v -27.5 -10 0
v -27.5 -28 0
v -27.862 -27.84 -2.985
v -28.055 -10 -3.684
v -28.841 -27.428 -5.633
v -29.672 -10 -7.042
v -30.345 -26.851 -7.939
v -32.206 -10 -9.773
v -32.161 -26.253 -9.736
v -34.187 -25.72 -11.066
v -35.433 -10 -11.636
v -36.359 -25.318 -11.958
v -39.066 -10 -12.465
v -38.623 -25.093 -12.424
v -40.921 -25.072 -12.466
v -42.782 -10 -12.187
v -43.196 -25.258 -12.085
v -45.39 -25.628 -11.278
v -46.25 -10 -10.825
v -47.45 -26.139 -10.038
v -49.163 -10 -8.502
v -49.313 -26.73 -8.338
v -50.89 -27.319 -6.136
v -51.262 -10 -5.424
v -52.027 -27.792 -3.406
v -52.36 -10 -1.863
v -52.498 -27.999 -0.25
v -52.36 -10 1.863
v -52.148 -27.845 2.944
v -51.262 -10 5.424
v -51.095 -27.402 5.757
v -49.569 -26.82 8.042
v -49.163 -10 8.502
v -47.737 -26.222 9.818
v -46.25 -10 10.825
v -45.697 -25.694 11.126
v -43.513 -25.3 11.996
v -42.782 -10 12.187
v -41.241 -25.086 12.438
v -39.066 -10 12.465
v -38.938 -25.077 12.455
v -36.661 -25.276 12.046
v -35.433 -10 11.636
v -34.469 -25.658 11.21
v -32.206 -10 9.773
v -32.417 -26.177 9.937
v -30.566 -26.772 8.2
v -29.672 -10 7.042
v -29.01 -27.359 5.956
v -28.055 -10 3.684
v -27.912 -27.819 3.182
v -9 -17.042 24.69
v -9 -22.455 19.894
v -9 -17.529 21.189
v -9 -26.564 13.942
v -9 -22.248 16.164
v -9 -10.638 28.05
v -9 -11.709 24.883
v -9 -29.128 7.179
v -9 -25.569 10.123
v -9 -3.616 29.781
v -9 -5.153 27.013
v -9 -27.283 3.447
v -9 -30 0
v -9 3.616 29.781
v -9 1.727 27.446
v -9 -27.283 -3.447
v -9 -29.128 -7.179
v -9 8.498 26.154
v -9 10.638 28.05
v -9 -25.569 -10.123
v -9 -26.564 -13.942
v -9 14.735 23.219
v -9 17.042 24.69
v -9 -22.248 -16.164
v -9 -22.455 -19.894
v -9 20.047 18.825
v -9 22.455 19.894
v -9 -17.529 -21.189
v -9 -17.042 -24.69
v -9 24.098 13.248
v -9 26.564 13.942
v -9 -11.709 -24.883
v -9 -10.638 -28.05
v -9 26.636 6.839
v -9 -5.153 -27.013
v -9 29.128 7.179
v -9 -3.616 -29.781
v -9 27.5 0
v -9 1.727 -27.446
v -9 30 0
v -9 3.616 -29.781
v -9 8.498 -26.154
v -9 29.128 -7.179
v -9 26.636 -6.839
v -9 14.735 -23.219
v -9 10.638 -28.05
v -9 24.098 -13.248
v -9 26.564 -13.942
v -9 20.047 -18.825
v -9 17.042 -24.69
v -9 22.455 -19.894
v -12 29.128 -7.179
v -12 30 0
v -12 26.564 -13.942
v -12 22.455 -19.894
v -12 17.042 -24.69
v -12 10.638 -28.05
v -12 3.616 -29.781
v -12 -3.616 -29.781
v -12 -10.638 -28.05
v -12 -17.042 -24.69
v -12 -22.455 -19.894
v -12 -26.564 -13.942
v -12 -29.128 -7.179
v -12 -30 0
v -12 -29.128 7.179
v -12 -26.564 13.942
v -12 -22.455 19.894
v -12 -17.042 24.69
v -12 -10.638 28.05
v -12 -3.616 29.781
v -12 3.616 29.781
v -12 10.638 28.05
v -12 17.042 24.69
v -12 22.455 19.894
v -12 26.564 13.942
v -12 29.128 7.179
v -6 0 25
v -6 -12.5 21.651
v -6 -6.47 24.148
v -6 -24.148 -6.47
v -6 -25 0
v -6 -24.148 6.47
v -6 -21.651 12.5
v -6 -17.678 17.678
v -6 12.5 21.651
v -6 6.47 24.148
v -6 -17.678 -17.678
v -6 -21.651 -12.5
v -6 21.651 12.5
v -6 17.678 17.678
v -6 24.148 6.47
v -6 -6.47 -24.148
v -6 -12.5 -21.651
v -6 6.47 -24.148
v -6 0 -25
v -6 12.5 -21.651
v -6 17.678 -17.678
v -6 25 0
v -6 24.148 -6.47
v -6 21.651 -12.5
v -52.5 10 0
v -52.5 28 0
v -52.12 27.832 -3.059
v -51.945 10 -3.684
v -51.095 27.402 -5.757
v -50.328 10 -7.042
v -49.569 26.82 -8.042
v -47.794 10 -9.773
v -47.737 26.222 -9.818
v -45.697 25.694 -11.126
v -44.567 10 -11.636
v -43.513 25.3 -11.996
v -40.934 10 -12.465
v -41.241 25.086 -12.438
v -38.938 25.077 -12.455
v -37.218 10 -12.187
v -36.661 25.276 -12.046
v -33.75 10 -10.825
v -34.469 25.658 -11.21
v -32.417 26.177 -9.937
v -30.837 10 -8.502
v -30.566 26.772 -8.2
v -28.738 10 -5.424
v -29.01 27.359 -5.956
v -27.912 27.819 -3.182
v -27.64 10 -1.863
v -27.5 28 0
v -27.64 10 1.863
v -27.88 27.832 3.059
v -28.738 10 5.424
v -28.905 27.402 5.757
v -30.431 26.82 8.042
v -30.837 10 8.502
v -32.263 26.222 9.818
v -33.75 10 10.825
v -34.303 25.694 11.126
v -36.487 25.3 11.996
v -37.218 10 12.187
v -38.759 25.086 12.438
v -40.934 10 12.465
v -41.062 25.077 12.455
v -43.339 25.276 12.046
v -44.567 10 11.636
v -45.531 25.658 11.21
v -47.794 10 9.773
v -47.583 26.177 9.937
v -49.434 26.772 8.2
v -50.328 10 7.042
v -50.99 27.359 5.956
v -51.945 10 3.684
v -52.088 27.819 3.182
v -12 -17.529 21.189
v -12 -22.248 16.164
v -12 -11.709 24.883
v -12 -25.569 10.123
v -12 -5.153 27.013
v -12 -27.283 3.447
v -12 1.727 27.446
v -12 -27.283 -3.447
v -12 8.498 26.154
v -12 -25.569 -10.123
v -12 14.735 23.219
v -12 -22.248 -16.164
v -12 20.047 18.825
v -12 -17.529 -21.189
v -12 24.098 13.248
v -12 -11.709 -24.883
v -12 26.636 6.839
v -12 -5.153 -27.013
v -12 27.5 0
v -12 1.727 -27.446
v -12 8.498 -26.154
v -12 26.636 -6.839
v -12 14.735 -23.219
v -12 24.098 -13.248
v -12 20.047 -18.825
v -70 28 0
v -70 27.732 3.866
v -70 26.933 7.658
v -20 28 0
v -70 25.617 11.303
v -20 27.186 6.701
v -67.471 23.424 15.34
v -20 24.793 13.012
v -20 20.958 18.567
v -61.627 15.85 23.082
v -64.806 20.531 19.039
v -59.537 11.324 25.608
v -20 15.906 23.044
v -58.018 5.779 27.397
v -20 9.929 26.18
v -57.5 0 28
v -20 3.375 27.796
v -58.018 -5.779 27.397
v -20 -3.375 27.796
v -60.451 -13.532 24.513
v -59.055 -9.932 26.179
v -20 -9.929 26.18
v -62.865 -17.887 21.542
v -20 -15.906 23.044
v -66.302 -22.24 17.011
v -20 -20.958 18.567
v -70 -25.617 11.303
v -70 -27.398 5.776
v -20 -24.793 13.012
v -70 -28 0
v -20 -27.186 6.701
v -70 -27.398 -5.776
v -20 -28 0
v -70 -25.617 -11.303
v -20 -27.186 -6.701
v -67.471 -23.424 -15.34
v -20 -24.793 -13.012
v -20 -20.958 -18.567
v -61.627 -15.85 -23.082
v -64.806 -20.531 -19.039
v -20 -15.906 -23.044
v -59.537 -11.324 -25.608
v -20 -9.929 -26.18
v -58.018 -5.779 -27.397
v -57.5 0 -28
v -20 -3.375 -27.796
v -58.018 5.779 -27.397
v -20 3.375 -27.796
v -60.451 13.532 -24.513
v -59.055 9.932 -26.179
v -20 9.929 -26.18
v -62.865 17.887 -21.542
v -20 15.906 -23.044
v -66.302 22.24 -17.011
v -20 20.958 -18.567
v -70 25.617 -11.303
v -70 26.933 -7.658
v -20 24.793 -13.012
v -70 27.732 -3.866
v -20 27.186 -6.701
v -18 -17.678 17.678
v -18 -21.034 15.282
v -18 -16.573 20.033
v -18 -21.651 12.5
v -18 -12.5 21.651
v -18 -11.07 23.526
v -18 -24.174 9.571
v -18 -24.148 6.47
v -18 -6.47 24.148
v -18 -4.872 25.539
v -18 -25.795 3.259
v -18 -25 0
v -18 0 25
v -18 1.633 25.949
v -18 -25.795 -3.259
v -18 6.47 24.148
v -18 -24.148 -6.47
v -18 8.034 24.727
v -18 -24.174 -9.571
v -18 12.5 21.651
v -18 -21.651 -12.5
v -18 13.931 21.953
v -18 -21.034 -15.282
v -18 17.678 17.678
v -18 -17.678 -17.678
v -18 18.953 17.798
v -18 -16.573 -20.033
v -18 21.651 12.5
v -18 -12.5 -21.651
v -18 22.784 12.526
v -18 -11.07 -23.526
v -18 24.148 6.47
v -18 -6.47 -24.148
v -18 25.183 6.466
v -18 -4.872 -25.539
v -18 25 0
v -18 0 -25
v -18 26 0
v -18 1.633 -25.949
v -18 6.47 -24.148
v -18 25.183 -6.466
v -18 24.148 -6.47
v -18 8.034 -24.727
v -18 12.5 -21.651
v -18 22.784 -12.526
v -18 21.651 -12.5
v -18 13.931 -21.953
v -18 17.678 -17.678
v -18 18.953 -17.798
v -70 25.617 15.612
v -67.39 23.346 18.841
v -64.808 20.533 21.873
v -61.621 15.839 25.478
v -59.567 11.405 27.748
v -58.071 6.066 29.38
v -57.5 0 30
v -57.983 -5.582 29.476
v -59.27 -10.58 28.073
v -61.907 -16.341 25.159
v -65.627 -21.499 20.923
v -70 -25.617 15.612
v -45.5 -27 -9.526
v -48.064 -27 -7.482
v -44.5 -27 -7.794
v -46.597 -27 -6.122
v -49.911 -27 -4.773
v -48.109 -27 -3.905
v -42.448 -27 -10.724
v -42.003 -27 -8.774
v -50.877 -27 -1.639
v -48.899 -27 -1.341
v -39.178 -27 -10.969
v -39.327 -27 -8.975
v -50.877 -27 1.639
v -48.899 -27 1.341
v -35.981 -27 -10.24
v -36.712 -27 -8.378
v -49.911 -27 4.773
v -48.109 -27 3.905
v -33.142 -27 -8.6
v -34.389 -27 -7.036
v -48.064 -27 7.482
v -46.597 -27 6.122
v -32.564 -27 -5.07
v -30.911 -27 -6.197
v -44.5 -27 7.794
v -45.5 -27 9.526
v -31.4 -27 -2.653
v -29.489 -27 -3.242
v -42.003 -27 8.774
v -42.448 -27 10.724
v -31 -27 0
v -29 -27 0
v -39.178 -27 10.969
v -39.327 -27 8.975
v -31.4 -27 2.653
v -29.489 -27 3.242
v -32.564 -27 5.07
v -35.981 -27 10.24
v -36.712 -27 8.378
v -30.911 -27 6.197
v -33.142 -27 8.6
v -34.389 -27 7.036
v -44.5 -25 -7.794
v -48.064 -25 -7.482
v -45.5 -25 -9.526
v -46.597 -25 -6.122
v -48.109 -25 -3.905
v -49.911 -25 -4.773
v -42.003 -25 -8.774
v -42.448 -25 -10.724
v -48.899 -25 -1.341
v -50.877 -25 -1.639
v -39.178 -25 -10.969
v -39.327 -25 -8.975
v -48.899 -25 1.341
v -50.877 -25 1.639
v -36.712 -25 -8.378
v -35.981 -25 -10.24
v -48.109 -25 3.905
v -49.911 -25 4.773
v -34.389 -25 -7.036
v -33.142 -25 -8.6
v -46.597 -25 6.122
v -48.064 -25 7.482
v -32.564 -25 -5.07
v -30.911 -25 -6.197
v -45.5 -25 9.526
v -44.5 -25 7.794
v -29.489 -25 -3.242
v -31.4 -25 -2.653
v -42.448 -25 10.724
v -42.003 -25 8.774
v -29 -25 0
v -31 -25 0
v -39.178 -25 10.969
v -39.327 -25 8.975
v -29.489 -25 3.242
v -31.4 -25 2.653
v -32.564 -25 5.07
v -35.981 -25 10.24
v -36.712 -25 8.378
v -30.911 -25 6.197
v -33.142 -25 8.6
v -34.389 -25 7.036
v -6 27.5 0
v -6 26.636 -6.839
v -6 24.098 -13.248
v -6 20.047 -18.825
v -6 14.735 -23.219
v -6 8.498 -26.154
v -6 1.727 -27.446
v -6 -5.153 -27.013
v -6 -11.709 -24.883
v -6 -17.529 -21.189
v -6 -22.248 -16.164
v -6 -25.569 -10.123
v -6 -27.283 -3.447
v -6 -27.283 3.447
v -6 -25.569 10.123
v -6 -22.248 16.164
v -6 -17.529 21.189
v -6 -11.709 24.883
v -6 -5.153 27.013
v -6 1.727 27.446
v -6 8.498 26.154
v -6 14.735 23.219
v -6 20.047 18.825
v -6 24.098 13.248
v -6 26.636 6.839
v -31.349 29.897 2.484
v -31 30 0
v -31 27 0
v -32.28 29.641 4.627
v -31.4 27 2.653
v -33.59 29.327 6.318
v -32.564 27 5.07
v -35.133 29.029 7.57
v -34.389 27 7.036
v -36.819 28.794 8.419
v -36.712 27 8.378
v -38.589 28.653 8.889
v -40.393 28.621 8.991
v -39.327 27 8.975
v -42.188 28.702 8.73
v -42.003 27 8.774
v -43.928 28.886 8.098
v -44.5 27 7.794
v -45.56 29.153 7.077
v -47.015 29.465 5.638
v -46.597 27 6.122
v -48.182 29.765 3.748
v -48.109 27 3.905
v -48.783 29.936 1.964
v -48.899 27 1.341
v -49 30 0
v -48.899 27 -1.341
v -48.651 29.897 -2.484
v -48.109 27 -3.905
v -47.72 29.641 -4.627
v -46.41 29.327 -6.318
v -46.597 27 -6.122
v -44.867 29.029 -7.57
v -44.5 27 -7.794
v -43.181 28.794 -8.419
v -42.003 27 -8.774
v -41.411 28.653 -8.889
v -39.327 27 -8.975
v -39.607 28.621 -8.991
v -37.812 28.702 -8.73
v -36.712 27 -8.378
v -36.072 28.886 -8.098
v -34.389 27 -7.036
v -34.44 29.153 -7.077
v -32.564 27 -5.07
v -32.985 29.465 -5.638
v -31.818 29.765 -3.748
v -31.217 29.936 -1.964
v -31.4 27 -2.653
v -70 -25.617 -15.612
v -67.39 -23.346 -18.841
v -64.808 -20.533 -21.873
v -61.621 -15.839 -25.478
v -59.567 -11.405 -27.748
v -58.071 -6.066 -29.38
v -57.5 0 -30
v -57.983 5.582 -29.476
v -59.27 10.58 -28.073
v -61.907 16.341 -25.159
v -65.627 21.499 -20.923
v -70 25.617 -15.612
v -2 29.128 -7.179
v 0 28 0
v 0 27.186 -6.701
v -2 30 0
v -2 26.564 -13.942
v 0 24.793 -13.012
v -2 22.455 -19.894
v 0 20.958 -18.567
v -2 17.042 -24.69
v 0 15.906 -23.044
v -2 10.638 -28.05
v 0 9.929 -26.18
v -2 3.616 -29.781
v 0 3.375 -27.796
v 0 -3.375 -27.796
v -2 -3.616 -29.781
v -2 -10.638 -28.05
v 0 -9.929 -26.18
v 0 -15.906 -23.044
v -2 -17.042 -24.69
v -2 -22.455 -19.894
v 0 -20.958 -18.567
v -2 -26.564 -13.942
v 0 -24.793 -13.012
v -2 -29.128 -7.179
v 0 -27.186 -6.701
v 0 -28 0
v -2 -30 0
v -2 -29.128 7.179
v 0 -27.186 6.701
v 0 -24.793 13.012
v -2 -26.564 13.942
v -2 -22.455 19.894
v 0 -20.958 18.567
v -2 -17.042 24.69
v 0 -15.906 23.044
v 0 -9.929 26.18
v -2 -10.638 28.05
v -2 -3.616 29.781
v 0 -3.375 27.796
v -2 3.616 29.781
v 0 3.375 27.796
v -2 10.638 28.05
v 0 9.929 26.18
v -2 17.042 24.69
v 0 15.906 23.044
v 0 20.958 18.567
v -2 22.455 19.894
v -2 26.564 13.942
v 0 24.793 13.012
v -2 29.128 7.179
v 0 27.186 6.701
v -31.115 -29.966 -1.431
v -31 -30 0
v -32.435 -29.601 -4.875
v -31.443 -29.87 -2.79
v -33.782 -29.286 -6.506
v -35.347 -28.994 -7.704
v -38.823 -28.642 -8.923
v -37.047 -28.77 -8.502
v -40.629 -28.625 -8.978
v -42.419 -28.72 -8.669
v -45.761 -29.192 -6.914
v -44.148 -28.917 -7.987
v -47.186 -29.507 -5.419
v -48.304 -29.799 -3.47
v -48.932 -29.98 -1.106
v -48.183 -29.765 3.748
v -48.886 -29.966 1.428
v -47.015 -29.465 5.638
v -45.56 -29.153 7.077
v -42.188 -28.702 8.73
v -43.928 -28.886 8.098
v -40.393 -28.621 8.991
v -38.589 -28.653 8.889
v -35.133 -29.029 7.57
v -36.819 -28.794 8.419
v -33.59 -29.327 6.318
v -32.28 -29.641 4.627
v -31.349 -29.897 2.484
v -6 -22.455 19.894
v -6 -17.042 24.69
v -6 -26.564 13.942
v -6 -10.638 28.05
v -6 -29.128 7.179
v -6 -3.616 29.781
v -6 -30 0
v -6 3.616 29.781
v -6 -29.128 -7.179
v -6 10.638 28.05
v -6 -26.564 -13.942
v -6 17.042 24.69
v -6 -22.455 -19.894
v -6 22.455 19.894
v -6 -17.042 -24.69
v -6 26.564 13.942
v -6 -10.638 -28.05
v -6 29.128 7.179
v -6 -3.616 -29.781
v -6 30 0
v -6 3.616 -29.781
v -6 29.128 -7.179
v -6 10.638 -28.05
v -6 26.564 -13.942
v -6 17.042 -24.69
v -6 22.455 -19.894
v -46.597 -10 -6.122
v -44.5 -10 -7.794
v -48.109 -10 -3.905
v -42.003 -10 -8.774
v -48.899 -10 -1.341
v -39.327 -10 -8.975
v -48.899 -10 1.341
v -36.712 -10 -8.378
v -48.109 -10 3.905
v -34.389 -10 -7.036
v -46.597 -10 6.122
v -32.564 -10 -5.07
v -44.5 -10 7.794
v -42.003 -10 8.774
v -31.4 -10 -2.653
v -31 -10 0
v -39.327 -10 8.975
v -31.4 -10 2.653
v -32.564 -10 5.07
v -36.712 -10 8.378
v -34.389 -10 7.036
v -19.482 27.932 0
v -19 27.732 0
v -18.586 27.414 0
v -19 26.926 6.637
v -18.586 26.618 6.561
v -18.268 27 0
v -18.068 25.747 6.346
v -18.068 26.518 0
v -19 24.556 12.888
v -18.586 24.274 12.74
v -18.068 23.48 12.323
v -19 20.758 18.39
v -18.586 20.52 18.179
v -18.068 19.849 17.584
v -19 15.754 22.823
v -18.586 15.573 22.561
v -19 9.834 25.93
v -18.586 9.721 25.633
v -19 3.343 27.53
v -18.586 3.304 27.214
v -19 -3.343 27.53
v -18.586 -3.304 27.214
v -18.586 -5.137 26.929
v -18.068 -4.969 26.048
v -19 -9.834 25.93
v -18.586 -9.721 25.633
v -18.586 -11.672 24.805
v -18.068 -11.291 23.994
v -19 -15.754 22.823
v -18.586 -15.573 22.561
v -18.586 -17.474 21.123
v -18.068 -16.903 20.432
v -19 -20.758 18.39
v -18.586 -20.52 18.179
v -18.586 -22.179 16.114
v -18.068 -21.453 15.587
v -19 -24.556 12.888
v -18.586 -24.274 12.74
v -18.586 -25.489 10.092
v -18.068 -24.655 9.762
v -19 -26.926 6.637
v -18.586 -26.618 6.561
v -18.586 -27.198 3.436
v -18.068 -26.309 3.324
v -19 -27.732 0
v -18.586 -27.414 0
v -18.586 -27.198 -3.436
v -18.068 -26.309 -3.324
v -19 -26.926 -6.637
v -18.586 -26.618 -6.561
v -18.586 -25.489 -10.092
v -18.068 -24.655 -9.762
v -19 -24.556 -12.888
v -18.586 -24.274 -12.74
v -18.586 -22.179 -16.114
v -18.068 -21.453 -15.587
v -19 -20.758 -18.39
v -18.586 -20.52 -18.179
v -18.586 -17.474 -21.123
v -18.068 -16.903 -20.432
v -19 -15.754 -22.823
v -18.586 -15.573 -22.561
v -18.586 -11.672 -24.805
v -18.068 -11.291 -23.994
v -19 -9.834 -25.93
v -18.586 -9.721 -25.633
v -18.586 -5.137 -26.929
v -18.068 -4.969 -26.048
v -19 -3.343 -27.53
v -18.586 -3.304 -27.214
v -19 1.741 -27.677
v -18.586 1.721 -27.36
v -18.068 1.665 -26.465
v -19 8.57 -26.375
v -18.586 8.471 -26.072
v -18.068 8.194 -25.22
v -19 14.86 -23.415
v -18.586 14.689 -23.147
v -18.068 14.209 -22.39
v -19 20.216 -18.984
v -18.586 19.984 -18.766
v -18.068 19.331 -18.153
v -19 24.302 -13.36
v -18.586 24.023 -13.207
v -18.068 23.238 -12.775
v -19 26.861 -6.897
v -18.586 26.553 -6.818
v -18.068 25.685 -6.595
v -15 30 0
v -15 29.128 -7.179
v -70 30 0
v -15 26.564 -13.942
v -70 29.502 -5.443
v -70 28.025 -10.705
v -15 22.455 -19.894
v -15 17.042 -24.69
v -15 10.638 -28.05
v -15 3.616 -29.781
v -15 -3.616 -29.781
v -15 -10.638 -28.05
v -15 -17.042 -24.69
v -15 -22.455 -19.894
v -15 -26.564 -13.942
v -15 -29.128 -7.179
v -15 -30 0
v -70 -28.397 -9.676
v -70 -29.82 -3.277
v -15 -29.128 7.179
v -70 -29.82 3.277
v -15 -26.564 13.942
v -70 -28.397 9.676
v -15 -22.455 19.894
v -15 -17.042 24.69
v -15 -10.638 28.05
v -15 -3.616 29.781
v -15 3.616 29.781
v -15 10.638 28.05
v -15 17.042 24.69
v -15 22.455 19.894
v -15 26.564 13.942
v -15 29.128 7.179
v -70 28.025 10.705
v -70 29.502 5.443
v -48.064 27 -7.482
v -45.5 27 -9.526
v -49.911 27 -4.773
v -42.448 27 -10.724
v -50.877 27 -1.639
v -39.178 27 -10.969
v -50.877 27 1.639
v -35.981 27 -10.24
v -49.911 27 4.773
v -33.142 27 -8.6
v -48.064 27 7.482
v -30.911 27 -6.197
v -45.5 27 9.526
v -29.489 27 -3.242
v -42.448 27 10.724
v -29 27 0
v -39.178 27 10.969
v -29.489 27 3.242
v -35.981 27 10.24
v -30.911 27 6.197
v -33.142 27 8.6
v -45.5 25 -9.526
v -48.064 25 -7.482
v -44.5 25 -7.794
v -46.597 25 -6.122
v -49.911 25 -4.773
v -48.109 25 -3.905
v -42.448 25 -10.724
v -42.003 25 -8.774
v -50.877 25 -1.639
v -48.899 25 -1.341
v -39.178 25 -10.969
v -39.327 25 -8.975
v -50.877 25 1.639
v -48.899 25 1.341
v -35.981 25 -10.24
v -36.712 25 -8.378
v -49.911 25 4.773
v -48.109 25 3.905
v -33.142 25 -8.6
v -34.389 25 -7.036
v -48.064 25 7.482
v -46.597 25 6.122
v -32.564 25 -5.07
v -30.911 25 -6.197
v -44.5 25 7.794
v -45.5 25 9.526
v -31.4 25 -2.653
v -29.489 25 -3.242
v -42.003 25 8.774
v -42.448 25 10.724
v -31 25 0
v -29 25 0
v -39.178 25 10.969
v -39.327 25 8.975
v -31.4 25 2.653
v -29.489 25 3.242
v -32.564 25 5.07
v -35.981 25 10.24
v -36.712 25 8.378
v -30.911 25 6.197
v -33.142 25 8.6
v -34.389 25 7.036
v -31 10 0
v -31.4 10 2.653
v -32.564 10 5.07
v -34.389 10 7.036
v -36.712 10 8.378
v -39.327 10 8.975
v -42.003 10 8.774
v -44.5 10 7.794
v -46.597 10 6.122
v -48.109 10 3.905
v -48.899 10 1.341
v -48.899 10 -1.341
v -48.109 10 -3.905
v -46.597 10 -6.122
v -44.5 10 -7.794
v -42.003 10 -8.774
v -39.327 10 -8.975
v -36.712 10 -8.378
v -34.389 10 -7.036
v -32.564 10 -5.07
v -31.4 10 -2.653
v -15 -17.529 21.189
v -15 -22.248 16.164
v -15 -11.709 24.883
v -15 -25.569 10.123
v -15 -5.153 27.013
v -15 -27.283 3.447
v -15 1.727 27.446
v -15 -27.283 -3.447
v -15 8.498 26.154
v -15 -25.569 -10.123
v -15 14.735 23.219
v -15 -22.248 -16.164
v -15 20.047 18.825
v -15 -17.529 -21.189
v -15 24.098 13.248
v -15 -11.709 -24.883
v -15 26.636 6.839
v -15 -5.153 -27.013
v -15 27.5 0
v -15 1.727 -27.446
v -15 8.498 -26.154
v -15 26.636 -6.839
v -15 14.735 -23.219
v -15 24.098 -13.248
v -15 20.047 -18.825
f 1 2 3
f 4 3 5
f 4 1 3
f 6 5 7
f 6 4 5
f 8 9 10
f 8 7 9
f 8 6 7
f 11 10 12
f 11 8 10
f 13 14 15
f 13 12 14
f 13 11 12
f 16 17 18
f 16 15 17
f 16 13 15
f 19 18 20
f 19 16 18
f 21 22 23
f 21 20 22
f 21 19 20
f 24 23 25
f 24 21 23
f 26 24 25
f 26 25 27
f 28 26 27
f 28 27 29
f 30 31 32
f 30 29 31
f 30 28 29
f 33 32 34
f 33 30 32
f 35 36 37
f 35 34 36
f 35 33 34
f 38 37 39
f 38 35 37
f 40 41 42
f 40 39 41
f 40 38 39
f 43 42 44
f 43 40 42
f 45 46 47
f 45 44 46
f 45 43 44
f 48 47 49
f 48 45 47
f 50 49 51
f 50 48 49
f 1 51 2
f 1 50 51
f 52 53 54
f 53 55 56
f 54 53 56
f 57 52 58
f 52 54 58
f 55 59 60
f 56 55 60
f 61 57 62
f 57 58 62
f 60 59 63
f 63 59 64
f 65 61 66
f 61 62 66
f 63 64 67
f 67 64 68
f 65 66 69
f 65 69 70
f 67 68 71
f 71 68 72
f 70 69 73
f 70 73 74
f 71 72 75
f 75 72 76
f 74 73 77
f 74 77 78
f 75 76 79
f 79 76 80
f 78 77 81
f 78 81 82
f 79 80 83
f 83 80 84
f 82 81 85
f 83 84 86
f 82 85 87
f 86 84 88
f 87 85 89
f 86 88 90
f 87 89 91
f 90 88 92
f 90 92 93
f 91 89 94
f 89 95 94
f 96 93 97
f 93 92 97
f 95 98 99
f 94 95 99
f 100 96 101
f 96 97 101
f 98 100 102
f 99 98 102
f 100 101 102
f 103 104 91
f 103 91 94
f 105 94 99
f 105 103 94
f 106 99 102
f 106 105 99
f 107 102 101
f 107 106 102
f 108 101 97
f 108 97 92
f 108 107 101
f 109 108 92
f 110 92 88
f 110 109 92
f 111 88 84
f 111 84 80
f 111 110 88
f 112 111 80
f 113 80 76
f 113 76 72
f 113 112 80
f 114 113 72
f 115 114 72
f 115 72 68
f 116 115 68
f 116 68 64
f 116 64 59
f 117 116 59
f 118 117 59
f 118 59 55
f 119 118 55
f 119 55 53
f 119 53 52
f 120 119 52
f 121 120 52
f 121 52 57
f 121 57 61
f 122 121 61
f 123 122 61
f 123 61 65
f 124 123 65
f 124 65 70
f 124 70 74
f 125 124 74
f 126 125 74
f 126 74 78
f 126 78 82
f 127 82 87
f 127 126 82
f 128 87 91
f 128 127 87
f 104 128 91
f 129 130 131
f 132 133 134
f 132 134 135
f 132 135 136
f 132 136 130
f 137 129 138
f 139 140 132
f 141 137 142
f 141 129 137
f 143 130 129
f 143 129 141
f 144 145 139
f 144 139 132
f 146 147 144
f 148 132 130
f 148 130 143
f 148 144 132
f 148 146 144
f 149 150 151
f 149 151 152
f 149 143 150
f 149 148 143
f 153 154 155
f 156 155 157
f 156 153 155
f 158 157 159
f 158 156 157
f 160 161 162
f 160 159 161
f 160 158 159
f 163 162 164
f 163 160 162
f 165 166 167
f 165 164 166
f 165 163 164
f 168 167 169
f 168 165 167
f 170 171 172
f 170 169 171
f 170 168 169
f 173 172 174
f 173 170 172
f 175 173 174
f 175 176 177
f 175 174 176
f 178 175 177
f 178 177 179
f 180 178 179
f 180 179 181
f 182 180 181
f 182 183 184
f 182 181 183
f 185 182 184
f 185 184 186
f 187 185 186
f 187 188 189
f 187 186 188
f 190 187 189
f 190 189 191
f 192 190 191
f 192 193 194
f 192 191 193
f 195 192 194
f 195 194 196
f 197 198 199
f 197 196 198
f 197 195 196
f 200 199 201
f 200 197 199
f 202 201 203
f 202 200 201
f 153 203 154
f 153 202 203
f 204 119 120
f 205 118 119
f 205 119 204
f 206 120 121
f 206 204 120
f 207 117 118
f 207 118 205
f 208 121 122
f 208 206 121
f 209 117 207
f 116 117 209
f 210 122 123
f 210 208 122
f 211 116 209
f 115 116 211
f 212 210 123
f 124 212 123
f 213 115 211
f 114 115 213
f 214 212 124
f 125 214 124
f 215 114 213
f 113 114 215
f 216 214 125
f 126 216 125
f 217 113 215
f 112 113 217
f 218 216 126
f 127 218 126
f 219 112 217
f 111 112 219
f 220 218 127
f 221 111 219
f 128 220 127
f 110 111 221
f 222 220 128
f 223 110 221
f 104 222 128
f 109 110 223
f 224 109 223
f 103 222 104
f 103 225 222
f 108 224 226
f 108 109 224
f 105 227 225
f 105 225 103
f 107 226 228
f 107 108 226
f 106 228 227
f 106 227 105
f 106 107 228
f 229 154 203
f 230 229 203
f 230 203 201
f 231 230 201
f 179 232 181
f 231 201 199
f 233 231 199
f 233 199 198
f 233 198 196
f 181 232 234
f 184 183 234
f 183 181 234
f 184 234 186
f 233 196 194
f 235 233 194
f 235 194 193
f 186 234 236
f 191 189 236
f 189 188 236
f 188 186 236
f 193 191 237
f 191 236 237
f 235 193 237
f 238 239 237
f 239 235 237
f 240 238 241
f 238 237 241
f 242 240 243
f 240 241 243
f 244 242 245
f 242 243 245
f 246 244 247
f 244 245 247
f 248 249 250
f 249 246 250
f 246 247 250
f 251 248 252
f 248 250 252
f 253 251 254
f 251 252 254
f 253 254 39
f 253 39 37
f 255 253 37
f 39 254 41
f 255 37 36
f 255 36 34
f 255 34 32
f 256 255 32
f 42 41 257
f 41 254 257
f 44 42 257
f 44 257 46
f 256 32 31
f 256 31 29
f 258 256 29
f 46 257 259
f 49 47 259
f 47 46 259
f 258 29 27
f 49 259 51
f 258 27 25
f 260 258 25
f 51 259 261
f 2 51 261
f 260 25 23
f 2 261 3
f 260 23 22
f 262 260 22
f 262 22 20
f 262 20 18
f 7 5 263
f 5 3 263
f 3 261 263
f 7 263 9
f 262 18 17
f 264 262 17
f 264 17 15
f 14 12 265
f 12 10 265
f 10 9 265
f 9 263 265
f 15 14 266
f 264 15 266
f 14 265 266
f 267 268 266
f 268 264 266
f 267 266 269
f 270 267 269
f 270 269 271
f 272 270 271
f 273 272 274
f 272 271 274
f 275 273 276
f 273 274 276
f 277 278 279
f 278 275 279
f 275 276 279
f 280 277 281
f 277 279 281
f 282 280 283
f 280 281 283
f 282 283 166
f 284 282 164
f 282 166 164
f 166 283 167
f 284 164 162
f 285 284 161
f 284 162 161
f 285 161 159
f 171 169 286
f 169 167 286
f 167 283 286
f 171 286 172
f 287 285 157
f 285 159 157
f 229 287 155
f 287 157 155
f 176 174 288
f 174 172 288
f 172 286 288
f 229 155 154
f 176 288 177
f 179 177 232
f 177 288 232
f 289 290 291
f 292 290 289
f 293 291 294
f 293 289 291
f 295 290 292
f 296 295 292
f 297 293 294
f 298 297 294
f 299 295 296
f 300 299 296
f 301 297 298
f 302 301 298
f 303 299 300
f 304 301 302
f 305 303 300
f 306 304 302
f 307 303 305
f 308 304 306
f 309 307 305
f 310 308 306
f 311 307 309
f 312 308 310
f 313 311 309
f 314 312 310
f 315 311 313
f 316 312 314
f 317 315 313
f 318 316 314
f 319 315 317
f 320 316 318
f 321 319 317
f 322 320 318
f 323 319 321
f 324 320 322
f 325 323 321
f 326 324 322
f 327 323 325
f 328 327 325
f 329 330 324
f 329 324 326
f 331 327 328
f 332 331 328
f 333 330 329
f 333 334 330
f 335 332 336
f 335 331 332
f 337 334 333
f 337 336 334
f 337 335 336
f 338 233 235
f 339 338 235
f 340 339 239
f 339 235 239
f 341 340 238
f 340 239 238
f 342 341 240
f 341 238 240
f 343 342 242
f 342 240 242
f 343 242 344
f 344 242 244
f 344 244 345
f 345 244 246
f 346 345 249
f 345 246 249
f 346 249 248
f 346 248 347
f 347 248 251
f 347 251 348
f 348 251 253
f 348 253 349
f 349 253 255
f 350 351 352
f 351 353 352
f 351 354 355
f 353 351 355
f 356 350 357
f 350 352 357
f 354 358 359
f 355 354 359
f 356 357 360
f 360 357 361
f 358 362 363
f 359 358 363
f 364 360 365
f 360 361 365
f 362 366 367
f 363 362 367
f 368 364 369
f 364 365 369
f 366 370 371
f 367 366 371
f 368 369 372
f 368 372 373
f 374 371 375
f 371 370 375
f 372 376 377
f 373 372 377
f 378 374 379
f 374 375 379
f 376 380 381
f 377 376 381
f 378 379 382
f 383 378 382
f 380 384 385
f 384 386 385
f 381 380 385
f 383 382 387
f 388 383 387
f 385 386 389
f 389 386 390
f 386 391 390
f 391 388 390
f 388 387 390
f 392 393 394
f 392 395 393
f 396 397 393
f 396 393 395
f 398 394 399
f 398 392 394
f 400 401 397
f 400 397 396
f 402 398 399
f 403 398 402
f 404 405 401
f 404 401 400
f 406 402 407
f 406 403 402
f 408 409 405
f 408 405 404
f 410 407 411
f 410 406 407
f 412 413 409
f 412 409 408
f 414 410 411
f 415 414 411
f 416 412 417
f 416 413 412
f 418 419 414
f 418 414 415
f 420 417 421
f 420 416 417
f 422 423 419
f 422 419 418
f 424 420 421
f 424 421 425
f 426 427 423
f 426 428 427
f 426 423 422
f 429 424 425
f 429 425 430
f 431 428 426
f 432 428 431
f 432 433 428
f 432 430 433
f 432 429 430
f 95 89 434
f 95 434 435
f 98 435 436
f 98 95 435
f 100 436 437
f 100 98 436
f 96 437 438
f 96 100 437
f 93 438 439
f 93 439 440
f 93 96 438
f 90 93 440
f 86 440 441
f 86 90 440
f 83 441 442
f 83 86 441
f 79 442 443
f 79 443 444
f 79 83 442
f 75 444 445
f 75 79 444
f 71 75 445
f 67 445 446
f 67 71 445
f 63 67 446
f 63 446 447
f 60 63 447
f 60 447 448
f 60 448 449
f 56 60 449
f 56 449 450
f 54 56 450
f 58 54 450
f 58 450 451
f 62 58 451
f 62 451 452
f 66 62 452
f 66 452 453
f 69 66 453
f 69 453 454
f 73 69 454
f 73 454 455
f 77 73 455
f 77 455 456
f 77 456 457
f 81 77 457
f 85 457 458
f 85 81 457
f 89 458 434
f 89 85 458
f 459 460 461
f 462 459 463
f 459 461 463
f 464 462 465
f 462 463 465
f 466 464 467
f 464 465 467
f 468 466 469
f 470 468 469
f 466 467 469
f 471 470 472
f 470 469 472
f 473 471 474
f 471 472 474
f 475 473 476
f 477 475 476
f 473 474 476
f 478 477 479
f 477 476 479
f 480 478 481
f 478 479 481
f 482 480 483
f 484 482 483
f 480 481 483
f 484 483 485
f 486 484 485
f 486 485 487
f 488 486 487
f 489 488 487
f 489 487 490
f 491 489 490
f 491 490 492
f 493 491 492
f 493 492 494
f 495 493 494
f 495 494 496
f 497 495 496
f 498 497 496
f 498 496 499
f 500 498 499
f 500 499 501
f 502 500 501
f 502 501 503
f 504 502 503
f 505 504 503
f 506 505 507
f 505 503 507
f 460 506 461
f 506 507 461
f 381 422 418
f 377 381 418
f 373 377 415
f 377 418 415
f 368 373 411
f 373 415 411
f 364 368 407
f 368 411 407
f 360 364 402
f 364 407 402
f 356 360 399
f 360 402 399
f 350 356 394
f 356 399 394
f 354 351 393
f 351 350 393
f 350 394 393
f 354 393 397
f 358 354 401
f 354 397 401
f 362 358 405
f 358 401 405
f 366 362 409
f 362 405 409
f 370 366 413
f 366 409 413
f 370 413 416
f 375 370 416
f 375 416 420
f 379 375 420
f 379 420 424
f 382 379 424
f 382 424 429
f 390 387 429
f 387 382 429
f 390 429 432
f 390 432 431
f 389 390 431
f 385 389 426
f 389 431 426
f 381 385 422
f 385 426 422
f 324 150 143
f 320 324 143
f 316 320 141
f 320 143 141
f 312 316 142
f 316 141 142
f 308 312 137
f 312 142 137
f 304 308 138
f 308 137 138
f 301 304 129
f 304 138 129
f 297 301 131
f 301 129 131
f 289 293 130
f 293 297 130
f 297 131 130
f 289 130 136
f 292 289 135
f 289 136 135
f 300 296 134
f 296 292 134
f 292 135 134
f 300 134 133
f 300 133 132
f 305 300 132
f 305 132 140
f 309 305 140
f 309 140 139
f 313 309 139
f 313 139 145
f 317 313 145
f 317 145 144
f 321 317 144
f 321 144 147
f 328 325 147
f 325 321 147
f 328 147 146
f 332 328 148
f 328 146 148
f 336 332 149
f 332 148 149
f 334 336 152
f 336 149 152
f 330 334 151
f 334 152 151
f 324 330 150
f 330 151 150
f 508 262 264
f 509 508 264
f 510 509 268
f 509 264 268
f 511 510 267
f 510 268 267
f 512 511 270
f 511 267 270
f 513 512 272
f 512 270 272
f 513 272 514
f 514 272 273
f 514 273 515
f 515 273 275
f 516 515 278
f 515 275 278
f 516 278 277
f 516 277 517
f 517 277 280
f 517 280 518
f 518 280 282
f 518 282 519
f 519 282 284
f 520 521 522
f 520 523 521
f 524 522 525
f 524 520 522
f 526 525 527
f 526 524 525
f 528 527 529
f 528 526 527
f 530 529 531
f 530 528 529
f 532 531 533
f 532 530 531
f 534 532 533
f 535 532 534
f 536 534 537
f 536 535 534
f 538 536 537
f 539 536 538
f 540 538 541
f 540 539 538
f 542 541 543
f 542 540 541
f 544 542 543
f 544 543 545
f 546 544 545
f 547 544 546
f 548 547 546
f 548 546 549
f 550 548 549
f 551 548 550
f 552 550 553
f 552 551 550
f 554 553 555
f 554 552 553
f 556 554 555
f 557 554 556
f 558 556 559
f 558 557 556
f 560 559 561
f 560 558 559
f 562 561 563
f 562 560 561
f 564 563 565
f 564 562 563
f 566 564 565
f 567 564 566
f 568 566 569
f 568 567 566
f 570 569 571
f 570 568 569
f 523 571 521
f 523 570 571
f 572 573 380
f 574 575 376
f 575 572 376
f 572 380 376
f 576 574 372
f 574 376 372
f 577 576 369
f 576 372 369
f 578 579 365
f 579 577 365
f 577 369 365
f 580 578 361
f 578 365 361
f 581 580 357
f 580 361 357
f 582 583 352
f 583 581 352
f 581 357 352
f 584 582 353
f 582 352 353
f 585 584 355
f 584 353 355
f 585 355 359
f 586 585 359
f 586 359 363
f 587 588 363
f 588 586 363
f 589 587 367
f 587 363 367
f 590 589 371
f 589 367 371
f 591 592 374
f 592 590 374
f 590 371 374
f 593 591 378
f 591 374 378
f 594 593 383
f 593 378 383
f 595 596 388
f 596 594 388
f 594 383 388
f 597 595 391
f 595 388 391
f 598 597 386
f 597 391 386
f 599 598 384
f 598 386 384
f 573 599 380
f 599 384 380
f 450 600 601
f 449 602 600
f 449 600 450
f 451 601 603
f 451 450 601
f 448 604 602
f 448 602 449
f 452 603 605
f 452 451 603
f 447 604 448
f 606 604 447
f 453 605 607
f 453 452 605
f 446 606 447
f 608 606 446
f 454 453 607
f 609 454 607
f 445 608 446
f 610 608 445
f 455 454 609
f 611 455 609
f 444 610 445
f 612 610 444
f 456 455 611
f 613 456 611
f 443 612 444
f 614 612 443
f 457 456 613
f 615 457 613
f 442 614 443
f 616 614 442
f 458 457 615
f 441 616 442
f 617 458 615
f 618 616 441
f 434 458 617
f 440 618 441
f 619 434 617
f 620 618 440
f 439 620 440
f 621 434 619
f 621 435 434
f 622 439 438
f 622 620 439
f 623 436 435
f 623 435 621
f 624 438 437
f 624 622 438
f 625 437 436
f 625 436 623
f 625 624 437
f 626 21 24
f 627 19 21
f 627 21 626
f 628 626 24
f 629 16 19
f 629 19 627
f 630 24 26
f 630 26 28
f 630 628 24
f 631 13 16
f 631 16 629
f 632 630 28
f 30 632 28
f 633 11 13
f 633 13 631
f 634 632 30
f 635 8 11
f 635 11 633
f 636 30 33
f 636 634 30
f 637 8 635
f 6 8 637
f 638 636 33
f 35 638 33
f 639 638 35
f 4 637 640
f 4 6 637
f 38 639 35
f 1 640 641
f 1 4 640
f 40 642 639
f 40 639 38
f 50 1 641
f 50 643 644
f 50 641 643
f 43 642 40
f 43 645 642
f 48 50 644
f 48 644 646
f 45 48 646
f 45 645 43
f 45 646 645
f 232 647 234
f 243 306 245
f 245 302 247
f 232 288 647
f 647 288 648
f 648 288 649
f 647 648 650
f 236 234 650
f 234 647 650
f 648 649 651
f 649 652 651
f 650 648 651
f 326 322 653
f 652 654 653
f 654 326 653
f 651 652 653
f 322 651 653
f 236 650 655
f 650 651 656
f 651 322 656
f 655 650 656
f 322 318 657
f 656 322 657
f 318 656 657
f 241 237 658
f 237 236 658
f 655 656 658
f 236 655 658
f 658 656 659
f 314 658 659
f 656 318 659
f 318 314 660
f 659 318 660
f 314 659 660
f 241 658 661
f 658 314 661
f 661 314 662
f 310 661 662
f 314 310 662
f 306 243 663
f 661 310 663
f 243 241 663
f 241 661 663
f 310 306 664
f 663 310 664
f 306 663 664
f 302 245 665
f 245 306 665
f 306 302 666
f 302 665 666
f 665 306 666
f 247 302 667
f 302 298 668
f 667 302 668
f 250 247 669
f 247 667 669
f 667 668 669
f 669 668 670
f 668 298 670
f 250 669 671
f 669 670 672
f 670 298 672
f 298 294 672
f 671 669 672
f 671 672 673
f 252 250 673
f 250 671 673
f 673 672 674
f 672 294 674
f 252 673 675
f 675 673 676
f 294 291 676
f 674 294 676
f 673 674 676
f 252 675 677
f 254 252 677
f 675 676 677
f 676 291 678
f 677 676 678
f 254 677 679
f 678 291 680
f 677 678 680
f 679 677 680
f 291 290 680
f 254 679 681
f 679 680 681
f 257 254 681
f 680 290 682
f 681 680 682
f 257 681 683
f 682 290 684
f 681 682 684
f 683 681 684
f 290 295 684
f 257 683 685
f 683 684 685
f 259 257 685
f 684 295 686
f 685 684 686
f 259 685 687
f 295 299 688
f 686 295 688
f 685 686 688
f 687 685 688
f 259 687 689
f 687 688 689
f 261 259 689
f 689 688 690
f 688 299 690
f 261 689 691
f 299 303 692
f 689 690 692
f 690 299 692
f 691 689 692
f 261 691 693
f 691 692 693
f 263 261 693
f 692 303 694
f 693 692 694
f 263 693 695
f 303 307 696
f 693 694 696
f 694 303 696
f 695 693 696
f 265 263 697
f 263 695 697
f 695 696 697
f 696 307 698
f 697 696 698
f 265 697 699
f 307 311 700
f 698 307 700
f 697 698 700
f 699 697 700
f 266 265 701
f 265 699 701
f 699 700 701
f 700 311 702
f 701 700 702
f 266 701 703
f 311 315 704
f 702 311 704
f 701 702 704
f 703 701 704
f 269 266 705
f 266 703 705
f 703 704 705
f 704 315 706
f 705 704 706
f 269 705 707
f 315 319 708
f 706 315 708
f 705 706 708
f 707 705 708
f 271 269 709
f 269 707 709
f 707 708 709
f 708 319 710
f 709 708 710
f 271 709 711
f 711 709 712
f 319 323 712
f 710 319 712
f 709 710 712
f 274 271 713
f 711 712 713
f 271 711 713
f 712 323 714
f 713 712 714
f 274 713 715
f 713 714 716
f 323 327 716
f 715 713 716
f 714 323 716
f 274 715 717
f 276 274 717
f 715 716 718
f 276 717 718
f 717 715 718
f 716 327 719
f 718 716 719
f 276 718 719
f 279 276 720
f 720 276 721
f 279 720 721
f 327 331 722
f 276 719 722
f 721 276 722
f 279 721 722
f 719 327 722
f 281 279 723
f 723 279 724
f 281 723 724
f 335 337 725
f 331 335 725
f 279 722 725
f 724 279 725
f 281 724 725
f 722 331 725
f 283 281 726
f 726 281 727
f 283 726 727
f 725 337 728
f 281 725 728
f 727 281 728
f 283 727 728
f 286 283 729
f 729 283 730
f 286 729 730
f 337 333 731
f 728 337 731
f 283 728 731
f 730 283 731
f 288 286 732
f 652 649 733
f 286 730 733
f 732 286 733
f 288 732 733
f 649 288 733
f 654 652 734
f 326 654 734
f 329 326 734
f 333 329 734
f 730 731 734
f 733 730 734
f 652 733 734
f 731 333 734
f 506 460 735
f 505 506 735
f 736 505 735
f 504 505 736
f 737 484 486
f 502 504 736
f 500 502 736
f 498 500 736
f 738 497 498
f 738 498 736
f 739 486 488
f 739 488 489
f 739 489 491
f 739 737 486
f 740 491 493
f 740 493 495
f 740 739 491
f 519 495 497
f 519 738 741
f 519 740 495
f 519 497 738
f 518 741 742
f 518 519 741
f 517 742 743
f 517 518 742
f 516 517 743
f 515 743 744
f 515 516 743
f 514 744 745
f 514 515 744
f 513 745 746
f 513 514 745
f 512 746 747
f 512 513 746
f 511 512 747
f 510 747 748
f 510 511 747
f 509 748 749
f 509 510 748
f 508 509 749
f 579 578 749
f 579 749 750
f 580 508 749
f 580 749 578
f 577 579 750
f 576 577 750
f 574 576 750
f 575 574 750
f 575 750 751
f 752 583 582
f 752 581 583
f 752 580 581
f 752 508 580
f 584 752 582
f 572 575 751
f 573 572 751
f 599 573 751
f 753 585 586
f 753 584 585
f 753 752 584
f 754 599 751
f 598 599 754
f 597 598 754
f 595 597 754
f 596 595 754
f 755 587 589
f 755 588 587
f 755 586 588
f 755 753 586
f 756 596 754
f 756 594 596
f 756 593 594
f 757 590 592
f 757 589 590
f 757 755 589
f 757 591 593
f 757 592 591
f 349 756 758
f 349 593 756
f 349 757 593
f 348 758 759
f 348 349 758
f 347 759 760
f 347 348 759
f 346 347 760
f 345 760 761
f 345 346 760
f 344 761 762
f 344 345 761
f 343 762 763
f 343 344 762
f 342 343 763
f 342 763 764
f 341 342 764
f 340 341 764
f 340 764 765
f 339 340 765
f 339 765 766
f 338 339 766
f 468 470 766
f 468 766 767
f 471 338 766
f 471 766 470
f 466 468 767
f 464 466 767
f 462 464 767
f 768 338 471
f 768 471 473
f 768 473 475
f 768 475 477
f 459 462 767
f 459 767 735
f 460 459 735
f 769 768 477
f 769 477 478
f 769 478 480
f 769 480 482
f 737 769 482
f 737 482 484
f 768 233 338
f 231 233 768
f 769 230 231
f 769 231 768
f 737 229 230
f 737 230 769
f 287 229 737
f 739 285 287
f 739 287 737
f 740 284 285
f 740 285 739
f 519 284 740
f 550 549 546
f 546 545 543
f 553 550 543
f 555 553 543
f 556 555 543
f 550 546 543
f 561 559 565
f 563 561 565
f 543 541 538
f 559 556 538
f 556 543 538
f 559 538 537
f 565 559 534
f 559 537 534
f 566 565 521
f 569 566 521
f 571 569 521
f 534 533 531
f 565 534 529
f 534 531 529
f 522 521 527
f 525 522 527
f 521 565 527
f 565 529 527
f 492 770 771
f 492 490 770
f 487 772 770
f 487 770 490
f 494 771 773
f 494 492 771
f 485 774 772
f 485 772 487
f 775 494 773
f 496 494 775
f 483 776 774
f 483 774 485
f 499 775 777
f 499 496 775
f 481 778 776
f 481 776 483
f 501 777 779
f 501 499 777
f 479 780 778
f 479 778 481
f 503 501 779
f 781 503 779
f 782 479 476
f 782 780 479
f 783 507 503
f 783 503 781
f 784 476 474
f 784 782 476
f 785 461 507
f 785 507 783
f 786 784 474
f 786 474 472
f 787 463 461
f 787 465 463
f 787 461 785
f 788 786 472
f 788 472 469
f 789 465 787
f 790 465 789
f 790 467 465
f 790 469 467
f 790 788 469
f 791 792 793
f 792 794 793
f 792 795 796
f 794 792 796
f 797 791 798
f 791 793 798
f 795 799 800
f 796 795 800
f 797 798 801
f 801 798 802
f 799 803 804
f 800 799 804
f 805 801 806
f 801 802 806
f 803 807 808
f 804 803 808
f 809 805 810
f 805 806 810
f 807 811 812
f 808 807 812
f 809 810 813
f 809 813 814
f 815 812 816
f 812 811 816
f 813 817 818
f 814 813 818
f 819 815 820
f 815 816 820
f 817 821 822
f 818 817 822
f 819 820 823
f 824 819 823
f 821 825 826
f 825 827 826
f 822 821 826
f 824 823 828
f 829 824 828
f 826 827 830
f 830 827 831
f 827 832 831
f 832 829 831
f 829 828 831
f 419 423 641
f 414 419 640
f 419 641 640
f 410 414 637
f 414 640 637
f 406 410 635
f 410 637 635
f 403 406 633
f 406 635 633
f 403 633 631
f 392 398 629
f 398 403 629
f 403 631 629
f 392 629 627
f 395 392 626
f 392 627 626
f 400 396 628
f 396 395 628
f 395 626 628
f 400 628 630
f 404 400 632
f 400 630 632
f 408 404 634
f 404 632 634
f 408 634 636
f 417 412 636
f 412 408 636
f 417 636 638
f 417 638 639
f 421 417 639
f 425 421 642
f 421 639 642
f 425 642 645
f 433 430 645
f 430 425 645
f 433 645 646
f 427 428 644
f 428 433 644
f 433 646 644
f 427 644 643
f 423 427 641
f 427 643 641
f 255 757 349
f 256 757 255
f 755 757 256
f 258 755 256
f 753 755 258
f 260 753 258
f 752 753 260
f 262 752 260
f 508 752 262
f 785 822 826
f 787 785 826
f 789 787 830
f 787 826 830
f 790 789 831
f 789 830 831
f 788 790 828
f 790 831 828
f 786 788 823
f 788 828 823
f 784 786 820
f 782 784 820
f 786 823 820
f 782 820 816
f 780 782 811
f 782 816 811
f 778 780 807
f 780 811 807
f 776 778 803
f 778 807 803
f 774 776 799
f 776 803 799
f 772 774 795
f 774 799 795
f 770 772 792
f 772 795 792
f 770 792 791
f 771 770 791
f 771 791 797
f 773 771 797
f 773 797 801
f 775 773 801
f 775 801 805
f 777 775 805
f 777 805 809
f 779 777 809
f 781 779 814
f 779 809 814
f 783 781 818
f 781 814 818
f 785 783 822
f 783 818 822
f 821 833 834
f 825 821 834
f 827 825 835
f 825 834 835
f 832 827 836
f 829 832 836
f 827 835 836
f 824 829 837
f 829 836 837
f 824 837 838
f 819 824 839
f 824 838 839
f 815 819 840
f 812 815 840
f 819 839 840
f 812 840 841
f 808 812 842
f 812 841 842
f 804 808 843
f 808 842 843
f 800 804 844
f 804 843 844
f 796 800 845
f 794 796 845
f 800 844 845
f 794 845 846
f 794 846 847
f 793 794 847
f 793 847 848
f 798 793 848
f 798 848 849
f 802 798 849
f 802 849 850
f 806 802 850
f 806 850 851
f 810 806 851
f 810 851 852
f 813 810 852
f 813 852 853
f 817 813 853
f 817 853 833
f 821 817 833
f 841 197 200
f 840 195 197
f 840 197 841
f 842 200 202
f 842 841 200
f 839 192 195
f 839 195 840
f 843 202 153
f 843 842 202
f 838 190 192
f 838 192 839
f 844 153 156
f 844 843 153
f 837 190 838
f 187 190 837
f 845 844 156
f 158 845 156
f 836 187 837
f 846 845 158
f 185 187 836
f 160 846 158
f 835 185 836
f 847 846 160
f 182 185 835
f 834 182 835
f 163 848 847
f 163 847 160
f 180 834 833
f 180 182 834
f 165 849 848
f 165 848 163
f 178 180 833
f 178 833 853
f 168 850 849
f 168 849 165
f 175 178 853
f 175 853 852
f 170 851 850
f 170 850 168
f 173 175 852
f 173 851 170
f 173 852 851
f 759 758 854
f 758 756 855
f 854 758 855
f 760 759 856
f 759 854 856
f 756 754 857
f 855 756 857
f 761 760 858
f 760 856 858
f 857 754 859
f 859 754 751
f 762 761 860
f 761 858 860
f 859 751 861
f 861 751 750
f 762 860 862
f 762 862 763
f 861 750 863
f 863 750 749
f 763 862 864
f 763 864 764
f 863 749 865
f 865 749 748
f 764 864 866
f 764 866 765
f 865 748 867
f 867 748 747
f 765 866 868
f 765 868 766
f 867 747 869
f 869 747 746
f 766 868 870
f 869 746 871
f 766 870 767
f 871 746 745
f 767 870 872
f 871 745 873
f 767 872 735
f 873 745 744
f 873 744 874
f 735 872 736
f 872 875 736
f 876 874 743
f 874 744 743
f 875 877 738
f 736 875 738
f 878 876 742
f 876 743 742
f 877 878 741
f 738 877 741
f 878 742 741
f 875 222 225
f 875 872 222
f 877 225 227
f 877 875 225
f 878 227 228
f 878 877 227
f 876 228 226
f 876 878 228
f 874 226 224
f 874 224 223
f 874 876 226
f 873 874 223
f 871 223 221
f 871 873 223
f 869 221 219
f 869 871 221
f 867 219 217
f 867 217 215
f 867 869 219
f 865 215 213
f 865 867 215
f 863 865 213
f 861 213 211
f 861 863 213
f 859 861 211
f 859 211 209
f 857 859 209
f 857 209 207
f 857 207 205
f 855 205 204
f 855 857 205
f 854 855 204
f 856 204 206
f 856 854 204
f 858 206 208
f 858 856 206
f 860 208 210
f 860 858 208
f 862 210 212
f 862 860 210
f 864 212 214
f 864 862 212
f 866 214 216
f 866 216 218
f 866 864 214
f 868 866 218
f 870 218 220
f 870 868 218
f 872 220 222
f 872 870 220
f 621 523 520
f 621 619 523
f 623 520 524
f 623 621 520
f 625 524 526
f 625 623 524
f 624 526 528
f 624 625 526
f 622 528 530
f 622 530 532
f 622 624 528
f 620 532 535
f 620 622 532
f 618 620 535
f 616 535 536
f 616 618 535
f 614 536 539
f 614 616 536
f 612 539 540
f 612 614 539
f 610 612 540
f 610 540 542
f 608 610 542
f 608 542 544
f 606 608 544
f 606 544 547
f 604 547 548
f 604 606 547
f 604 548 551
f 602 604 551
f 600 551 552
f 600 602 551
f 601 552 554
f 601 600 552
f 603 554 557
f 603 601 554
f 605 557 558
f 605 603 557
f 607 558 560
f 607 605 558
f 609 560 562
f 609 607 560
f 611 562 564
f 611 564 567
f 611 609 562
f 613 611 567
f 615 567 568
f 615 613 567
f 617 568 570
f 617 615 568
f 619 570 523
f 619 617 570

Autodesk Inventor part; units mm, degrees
ref_plane "YZ Plane" through (0, 0, 0) normal (1, 0, 0) x (0, 1, 0)
ref_plane "XZ Plane" through (0, 0, 0) normal (0, 1, 0) x (-1, 0, 0)
ref_plane "XY Plane" through (0, 0, 0) normal (0, 0, 1) x (1, 0, 0)
sketch "Esboço1" plane through (0, 0, 0) normal (0, 0, 1) x (1, 0, 0)
  line L0 (0, 0) -> (-70, 0)
  line L1 (0, 0) -> (0, 30)
  line L2 (-70, 30) -> (-70, 28)
  line L3 (-70, 28) -> (-18, 28)
  line L4 (-18, 28) -> (-58.0179, 28)
  line L5 (-18, 28) -> (-18, 25)
  line L6 (-18, 25) -> (-6, 25)
  line L7 (-6, 25) -> (-6, 0)
  line L8 (0, 30) -> (-6, 30)
  line L9 (-6, 30) -> (-6, 27.5)
  line L10 (-6, 27.5) -> (-9, 27.5)
  line L11 (-9, 27.5) -> (-9, 30)
  line L12 (-9, 30) -> (-12, 30)
  line L13 (-12, 30) -> (-12, 27.5)
  line L14 (-12, 27.5) -> (-15, 27.5)
  line L15 (-15, 27.5) -> (-15, 30)
  line L16 (-15, 30) -> (-70, 30)
  line L17 (-6, 0) -> (0, 0)
  dimension "d1" = 60
  dimension "d2" = 70
  dimension "d4" = 70
  dimension "d5" = 56
  dimension "d8" = 52
  dimension "d9" = 64
  dimension "d10" = 50
  dimension "d11" = 6
  dimension "d12" = 55
  dimension "d13" = 3
  dimension "d14" = 3
  dimension "d15" = 3
  dimension "d16" = 55
  dimension "d17" = 55
  dimension "d18" = 60
revolve "Revolução1" add sketch "Esboço1" angle 360 about axis through (0, 0, 0) along (-1, 0, 0)
chamfer "Chanfro1" distance 2 angle 45 1 edges at (0, -30, 0)
fillet "Arredondamento1" radius 2 1 edges at (-18, -28, 0)
sketch "Esboço2" plane through (0, 0, 0) normal (0, 0, 1) x (1, 0, 0)
  line L0 (-70, 0) -> (-40, 0)
  line L1 (-70, 0) -> (-90, 0)
  circle A0 centre (-90, 0) radius 32.5
  point P0 (0, 0)
  dimension "d24" = 70
  dimension "d25" = 30
  dimension "d26" = 20
  dimension "d27" = 65
  dimension "d28" = 90
extrude "Extrusão1" cut sketch "Esboço2" along normal mid plane 200000
sketch "Esboço3" plane through (0, 0, 0) normal (0, 1, 0) x (-1, 0, 0)
  line L0 (70, -15.6125) -> (70, 15.6125) projected
  line L1 (70, 0) -> (40, 0)
  line L2 (70, -15.6125) -> (70, 15.6125) projected
  circle A0 centre (40, 0) radius 12.5
  point P0 (0, 0)
  dimension "d32" = 30
  dimension "d33" = 25
extrude "Extrusão2" add sketch "Esboço3" along normal up to next
sketch "Esboço4" plane through (-40, 0, 0) normal (0, -1, 0) x (1, 0, 0)
  circle A0 centre (0, 0) radius 12.5
  point P0 (40, 0)
extrude "Extrusão3" add sketch "Esboço4" along normal up to next
sketch "Esboço5" plane through (-6, 0, 0) normal (-1, 0, 0) x (0, 0, 1)
  line L0 (-17.5, -10) -> (17.5, -10)
  line L1 (17.5, -10) -> (17.5, 10)
  line L2 (17.5, 10) -> (-17.5, 10)
  line L3 (-17.5, 10) -> (-17.5, -10)
  line L4 (-17.5, -10) -> (17.5, 10) construction
  line L5 (17.5, -10) -> (-17.5, 10) construction
  point P0 (0, 0)
  dimension "d38" = 20
extrude "Extrusão4" cut sketch "Esboço5" along normal blind 100
sketch "Esboço6" plane through (-40, 10, 0) normal (0, -1, 0) x (1, 0, 0)
  circle A0 centre (0, 0) radius 12.5 projected
  circle A1 centre (0, 0) radius 9
  point P0 (40, 0)
  dimension "d41" = 18
extrude "Extrusão5" cut sketch "Esboço6" along normal mid plane 100 contours A1
sketch "Esboço8" plane through (0, 0, 0) normal (0, 0, 1) x (1, 0, 0)
  line L0 (0, 0) -> (-31, 0)
  line L1 (-31, 27) -> (-29, 27)
  line L2 (-29, 27) -> (-29, 25)
  line L3 (-29, 25) -> (-31, 25)
  line L4 (-31, 27) -> (-31, 25)
  line L5 (-31, -27) -> (-29, -27)
  line L6 (-29, -27) -> (-29, -25)
  line L7 (-29, -25) -> (-31, -25)
  line L8 (-31, -27) -> (-31, -25)
  line L9 (-49, 30) -> (-49, 10) projected
  line L10 (-40, 30) -> (-40, -34.5055)
  point P0 (-31, 30)
  dimension "d45" = 3
  dimension "d46" = 2
  dimension "d47" = 2
  dimension "d49" = 18
revolve "Revolução2" cut sketch "Esboço8" angle 360 about axis through (-40, 30, 0) along (0, -1, 0)
properties part number "02"
